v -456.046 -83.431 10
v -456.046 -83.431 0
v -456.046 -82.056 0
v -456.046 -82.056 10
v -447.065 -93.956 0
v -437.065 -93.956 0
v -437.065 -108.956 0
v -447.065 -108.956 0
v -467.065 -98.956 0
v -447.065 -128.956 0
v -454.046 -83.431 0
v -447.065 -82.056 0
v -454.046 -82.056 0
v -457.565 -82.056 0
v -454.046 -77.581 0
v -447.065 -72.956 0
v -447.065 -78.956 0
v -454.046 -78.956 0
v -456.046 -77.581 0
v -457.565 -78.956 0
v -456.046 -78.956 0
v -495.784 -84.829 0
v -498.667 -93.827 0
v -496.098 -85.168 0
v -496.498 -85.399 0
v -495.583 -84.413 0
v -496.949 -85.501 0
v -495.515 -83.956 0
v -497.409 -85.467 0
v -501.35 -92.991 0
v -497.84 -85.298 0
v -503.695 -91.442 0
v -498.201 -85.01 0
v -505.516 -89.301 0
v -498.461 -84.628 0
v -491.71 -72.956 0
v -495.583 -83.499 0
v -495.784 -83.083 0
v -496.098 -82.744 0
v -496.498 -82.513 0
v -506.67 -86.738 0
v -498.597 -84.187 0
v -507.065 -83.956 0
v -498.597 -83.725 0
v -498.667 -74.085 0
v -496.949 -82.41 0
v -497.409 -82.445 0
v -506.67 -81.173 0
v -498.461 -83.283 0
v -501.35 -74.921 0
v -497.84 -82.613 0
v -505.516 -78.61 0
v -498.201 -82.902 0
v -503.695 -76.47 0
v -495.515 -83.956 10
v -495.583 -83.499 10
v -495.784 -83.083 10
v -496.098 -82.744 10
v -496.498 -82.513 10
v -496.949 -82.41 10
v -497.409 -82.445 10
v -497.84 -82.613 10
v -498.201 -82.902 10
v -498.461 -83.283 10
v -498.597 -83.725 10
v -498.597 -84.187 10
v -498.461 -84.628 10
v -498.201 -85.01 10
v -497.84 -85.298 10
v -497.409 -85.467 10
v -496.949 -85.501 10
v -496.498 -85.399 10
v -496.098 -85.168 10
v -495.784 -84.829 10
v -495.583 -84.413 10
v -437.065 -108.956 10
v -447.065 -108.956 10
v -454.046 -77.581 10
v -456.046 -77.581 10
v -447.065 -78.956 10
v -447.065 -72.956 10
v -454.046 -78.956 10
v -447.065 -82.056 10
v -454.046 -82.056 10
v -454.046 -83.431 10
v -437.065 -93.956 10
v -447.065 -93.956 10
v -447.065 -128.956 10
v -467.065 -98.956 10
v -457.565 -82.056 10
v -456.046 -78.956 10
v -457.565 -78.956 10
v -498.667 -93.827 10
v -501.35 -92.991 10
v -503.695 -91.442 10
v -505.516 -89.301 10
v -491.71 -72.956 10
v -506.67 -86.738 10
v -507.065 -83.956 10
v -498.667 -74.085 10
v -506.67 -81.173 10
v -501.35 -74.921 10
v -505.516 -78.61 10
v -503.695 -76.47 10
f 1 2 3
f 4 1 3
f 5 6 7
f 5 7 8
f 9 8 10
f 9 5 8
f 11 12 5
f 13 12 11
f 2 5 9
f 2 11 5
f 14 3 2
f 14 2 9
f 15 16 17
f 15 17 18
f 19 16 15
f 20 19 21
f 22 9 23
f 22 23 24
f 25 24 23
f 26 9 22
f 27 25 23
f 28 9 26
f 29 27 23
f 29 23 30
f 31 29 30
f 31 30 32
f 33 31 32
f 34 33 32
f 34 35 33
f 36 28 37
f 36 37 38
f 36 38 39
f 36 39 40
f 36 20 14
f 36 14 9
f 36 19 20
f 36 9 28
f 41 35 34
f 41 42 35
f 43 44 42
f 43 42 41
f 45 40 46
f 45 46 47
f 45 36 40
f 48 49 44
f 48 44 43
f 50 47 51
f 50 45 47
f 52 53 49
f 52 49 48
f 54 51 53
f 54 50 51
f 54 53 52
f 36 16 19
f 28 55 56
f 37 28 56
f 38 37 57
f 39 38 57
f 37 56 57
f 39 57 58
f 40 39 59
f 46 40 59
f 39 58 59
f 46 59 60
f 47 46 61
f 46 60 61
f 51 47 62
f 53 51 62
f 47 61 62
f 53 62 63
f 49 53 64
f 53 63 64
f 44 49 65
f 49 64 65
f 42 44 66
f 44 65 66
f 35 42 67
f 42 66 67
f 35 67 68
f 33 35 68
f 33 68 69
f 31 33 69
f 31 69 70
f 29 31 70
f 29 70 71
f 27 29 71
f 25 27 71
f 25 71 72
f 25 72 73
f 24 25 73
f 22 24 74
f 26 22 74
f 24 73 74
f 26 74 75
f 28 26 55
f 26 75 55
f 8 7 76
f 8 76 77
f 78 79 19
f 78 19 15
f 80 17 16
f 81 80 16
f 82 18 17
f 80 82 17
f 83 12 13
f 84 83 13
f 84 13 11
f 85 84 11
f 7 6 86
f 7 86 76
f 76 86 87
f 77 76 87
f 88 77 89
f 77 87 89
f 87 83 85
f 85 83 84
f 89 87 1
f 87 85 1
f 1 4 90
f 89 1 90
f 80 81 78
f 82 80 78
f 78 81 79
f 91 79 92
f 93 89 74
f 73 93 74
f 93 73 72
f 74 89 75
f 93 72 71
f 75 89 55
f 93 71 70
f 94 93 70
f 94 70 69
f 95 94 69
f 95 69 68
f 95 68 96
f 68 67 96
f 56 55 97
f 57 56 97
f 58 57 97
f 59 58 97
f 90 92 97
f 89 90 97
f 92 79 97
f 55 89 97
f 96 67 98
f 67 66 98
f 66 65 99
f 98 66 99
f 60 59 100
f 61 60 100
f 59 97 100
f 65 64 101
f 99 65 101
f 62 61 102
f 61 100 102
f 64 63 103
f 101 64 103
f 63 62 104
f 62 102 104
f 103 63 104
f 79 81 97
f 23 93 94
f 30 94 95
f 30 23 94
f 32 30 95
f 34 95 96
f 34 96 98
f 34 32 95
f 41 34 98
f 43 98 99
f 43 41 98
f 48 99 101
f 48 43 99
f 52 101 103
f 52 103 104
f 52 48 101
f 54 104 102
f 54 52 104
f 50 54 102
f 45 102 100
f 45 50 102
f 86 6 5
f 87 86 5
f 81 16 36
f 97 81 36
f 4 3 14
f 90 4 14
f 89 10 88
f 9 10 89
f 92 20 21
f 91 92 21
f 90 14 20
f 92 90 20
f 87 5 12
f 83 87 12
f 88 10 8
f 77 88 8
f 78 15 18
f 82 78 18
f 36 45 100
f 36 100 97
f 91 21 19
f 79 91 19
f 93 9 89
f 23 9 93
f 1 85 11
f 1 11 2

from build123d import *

# Parameters (mm, degrees)
DODANIE_WYCI_GNI_CIE1_DEPTH = 10
SZKIC2_R                    = 1.55
WYTNIJ_WYCI_GNI_CIE1_DEPTH  = 10
SZKIC3_W                    = 10
SZKIC3_H                    = 20
SZKIC3_H_2                  = 25
WYTNIJ_WYCI_GNI_CIE2_DEPTH  = 10
WYTNIJ_WYCI_GNI_CIE3_DEPTH  = 10
SZKIC5_W                    = 44.64499878
SZKIC5_H                    = 4
WYTNIJ_WYCI_GNI_CIE4_DEPTH  = 10


with BuildPart() as part:
    # Szkic1 → Dodanie-wyciągnięcie1 (new body)
    with BuildSketch(Plane.XY):
        with BuildLine():
            Line((-437.064585695, -68.955768861), (-437.064585695, -98.955768861))
            Line((-437.064585695, -98.955768861), (-437.064585695, -128.955768861))
            Line((-437.064585695, -128.955768861), (-447.064585695, -128.955768861))
            Line((-447.064585695, -128.955768861), (-467.064585695, -98.955768861))
            Line((-467.064585695, -98.955768861), (-498.66666852, -93.826601178))
            ThreePointArc((-498.66666852, -93.826601178), (-507.064585695, -83.955768861), (-498.66666852, -74.084936545))
            Line((-498.66666852, -74.084936545), (-467.064585695, -68.955768861))
            Line((-467.064585695, -68.955768861), (-437.064585695, -68.955768861))
        make_face()
    extrude(amount=DODANIE_WYCI_GNI_CIE1_DEPTH)

    # Szkic2 → Wytnij-wyciągnięcie1 (cut)
    with BuildSketch(Plane.XY.offset(10)):
        with Locations((-497.064585695, -83.955768861)):
            Circle(SZKIC2_R)
    extrude(amount=-WYTNIJ_WYCI_GNI_CIE1_DEPTH, mode=Mode.SUBTRACT)

    # Szkic3 → Wytnij-wyciągnięcie2 (cut)
    with BuildSketch(Plane(origin=(0, 0, 0), x_dir=(-1, 0, 0), z_dir=(0, 0, -1))):
        with Locations((442.064585695, -118.955768861)):
            Rectangle(SZKIC3_W, SZKIC3_H)
        with Locations((442.064585695, -81.455768861)):
            Rectangle(SZKIC3_W, SZKIC3_H_2)
    extrude(amount=-WYTNIJ_WYCI_GNI_CIE2_DEPTH, mode=Mode.SUBTRACT)

    # Szkic4 → Wytnij-wyciągnięcie3 (cut)
    with BuildSketch(Plane(origin=(0, 0, 0), x_dir=(-1, 0, 0), z_dir=(0, 0, -1))):
        Polygon((447.064585695, -78.955768861), (447.064585695, -82.055768861), (454.046285695, -82.055768861), (454.046285695, -83.430768861), (456.046285695, -83.430768861), (456.046285695, -82.055768861), (457.564585695, -82.055768861), (457.564585695, -78.955768861), (456.046285695, -78.955768861), (456.046285695, -77.580768861), (454.046285695, -77.580768861), (454.046285695, -78.955768861), align=None)
    extrude(amount=-WYTNIJ_WYCI_GNI_CIE3_DEPTH, mode=Mode.SUBTRACT)

    # Szkic5 → Wytnij-wyciągnięcie4 (cut)
    with BuildSketch(Plane(origin=(0, 0, 0), x_dir=(-1, 0, 0), z_dir=(0, 0, -1))):
        with Locations((469.387085085, -70.955768861)):
            Rectangle(SZKIC5_W, SZKIC5_H)
    extrude(amount=-WYTNIJ_WYCI_GNI_CIE4_DEPTH, mode=Mode.SUBTRACT)


solid = part.part
